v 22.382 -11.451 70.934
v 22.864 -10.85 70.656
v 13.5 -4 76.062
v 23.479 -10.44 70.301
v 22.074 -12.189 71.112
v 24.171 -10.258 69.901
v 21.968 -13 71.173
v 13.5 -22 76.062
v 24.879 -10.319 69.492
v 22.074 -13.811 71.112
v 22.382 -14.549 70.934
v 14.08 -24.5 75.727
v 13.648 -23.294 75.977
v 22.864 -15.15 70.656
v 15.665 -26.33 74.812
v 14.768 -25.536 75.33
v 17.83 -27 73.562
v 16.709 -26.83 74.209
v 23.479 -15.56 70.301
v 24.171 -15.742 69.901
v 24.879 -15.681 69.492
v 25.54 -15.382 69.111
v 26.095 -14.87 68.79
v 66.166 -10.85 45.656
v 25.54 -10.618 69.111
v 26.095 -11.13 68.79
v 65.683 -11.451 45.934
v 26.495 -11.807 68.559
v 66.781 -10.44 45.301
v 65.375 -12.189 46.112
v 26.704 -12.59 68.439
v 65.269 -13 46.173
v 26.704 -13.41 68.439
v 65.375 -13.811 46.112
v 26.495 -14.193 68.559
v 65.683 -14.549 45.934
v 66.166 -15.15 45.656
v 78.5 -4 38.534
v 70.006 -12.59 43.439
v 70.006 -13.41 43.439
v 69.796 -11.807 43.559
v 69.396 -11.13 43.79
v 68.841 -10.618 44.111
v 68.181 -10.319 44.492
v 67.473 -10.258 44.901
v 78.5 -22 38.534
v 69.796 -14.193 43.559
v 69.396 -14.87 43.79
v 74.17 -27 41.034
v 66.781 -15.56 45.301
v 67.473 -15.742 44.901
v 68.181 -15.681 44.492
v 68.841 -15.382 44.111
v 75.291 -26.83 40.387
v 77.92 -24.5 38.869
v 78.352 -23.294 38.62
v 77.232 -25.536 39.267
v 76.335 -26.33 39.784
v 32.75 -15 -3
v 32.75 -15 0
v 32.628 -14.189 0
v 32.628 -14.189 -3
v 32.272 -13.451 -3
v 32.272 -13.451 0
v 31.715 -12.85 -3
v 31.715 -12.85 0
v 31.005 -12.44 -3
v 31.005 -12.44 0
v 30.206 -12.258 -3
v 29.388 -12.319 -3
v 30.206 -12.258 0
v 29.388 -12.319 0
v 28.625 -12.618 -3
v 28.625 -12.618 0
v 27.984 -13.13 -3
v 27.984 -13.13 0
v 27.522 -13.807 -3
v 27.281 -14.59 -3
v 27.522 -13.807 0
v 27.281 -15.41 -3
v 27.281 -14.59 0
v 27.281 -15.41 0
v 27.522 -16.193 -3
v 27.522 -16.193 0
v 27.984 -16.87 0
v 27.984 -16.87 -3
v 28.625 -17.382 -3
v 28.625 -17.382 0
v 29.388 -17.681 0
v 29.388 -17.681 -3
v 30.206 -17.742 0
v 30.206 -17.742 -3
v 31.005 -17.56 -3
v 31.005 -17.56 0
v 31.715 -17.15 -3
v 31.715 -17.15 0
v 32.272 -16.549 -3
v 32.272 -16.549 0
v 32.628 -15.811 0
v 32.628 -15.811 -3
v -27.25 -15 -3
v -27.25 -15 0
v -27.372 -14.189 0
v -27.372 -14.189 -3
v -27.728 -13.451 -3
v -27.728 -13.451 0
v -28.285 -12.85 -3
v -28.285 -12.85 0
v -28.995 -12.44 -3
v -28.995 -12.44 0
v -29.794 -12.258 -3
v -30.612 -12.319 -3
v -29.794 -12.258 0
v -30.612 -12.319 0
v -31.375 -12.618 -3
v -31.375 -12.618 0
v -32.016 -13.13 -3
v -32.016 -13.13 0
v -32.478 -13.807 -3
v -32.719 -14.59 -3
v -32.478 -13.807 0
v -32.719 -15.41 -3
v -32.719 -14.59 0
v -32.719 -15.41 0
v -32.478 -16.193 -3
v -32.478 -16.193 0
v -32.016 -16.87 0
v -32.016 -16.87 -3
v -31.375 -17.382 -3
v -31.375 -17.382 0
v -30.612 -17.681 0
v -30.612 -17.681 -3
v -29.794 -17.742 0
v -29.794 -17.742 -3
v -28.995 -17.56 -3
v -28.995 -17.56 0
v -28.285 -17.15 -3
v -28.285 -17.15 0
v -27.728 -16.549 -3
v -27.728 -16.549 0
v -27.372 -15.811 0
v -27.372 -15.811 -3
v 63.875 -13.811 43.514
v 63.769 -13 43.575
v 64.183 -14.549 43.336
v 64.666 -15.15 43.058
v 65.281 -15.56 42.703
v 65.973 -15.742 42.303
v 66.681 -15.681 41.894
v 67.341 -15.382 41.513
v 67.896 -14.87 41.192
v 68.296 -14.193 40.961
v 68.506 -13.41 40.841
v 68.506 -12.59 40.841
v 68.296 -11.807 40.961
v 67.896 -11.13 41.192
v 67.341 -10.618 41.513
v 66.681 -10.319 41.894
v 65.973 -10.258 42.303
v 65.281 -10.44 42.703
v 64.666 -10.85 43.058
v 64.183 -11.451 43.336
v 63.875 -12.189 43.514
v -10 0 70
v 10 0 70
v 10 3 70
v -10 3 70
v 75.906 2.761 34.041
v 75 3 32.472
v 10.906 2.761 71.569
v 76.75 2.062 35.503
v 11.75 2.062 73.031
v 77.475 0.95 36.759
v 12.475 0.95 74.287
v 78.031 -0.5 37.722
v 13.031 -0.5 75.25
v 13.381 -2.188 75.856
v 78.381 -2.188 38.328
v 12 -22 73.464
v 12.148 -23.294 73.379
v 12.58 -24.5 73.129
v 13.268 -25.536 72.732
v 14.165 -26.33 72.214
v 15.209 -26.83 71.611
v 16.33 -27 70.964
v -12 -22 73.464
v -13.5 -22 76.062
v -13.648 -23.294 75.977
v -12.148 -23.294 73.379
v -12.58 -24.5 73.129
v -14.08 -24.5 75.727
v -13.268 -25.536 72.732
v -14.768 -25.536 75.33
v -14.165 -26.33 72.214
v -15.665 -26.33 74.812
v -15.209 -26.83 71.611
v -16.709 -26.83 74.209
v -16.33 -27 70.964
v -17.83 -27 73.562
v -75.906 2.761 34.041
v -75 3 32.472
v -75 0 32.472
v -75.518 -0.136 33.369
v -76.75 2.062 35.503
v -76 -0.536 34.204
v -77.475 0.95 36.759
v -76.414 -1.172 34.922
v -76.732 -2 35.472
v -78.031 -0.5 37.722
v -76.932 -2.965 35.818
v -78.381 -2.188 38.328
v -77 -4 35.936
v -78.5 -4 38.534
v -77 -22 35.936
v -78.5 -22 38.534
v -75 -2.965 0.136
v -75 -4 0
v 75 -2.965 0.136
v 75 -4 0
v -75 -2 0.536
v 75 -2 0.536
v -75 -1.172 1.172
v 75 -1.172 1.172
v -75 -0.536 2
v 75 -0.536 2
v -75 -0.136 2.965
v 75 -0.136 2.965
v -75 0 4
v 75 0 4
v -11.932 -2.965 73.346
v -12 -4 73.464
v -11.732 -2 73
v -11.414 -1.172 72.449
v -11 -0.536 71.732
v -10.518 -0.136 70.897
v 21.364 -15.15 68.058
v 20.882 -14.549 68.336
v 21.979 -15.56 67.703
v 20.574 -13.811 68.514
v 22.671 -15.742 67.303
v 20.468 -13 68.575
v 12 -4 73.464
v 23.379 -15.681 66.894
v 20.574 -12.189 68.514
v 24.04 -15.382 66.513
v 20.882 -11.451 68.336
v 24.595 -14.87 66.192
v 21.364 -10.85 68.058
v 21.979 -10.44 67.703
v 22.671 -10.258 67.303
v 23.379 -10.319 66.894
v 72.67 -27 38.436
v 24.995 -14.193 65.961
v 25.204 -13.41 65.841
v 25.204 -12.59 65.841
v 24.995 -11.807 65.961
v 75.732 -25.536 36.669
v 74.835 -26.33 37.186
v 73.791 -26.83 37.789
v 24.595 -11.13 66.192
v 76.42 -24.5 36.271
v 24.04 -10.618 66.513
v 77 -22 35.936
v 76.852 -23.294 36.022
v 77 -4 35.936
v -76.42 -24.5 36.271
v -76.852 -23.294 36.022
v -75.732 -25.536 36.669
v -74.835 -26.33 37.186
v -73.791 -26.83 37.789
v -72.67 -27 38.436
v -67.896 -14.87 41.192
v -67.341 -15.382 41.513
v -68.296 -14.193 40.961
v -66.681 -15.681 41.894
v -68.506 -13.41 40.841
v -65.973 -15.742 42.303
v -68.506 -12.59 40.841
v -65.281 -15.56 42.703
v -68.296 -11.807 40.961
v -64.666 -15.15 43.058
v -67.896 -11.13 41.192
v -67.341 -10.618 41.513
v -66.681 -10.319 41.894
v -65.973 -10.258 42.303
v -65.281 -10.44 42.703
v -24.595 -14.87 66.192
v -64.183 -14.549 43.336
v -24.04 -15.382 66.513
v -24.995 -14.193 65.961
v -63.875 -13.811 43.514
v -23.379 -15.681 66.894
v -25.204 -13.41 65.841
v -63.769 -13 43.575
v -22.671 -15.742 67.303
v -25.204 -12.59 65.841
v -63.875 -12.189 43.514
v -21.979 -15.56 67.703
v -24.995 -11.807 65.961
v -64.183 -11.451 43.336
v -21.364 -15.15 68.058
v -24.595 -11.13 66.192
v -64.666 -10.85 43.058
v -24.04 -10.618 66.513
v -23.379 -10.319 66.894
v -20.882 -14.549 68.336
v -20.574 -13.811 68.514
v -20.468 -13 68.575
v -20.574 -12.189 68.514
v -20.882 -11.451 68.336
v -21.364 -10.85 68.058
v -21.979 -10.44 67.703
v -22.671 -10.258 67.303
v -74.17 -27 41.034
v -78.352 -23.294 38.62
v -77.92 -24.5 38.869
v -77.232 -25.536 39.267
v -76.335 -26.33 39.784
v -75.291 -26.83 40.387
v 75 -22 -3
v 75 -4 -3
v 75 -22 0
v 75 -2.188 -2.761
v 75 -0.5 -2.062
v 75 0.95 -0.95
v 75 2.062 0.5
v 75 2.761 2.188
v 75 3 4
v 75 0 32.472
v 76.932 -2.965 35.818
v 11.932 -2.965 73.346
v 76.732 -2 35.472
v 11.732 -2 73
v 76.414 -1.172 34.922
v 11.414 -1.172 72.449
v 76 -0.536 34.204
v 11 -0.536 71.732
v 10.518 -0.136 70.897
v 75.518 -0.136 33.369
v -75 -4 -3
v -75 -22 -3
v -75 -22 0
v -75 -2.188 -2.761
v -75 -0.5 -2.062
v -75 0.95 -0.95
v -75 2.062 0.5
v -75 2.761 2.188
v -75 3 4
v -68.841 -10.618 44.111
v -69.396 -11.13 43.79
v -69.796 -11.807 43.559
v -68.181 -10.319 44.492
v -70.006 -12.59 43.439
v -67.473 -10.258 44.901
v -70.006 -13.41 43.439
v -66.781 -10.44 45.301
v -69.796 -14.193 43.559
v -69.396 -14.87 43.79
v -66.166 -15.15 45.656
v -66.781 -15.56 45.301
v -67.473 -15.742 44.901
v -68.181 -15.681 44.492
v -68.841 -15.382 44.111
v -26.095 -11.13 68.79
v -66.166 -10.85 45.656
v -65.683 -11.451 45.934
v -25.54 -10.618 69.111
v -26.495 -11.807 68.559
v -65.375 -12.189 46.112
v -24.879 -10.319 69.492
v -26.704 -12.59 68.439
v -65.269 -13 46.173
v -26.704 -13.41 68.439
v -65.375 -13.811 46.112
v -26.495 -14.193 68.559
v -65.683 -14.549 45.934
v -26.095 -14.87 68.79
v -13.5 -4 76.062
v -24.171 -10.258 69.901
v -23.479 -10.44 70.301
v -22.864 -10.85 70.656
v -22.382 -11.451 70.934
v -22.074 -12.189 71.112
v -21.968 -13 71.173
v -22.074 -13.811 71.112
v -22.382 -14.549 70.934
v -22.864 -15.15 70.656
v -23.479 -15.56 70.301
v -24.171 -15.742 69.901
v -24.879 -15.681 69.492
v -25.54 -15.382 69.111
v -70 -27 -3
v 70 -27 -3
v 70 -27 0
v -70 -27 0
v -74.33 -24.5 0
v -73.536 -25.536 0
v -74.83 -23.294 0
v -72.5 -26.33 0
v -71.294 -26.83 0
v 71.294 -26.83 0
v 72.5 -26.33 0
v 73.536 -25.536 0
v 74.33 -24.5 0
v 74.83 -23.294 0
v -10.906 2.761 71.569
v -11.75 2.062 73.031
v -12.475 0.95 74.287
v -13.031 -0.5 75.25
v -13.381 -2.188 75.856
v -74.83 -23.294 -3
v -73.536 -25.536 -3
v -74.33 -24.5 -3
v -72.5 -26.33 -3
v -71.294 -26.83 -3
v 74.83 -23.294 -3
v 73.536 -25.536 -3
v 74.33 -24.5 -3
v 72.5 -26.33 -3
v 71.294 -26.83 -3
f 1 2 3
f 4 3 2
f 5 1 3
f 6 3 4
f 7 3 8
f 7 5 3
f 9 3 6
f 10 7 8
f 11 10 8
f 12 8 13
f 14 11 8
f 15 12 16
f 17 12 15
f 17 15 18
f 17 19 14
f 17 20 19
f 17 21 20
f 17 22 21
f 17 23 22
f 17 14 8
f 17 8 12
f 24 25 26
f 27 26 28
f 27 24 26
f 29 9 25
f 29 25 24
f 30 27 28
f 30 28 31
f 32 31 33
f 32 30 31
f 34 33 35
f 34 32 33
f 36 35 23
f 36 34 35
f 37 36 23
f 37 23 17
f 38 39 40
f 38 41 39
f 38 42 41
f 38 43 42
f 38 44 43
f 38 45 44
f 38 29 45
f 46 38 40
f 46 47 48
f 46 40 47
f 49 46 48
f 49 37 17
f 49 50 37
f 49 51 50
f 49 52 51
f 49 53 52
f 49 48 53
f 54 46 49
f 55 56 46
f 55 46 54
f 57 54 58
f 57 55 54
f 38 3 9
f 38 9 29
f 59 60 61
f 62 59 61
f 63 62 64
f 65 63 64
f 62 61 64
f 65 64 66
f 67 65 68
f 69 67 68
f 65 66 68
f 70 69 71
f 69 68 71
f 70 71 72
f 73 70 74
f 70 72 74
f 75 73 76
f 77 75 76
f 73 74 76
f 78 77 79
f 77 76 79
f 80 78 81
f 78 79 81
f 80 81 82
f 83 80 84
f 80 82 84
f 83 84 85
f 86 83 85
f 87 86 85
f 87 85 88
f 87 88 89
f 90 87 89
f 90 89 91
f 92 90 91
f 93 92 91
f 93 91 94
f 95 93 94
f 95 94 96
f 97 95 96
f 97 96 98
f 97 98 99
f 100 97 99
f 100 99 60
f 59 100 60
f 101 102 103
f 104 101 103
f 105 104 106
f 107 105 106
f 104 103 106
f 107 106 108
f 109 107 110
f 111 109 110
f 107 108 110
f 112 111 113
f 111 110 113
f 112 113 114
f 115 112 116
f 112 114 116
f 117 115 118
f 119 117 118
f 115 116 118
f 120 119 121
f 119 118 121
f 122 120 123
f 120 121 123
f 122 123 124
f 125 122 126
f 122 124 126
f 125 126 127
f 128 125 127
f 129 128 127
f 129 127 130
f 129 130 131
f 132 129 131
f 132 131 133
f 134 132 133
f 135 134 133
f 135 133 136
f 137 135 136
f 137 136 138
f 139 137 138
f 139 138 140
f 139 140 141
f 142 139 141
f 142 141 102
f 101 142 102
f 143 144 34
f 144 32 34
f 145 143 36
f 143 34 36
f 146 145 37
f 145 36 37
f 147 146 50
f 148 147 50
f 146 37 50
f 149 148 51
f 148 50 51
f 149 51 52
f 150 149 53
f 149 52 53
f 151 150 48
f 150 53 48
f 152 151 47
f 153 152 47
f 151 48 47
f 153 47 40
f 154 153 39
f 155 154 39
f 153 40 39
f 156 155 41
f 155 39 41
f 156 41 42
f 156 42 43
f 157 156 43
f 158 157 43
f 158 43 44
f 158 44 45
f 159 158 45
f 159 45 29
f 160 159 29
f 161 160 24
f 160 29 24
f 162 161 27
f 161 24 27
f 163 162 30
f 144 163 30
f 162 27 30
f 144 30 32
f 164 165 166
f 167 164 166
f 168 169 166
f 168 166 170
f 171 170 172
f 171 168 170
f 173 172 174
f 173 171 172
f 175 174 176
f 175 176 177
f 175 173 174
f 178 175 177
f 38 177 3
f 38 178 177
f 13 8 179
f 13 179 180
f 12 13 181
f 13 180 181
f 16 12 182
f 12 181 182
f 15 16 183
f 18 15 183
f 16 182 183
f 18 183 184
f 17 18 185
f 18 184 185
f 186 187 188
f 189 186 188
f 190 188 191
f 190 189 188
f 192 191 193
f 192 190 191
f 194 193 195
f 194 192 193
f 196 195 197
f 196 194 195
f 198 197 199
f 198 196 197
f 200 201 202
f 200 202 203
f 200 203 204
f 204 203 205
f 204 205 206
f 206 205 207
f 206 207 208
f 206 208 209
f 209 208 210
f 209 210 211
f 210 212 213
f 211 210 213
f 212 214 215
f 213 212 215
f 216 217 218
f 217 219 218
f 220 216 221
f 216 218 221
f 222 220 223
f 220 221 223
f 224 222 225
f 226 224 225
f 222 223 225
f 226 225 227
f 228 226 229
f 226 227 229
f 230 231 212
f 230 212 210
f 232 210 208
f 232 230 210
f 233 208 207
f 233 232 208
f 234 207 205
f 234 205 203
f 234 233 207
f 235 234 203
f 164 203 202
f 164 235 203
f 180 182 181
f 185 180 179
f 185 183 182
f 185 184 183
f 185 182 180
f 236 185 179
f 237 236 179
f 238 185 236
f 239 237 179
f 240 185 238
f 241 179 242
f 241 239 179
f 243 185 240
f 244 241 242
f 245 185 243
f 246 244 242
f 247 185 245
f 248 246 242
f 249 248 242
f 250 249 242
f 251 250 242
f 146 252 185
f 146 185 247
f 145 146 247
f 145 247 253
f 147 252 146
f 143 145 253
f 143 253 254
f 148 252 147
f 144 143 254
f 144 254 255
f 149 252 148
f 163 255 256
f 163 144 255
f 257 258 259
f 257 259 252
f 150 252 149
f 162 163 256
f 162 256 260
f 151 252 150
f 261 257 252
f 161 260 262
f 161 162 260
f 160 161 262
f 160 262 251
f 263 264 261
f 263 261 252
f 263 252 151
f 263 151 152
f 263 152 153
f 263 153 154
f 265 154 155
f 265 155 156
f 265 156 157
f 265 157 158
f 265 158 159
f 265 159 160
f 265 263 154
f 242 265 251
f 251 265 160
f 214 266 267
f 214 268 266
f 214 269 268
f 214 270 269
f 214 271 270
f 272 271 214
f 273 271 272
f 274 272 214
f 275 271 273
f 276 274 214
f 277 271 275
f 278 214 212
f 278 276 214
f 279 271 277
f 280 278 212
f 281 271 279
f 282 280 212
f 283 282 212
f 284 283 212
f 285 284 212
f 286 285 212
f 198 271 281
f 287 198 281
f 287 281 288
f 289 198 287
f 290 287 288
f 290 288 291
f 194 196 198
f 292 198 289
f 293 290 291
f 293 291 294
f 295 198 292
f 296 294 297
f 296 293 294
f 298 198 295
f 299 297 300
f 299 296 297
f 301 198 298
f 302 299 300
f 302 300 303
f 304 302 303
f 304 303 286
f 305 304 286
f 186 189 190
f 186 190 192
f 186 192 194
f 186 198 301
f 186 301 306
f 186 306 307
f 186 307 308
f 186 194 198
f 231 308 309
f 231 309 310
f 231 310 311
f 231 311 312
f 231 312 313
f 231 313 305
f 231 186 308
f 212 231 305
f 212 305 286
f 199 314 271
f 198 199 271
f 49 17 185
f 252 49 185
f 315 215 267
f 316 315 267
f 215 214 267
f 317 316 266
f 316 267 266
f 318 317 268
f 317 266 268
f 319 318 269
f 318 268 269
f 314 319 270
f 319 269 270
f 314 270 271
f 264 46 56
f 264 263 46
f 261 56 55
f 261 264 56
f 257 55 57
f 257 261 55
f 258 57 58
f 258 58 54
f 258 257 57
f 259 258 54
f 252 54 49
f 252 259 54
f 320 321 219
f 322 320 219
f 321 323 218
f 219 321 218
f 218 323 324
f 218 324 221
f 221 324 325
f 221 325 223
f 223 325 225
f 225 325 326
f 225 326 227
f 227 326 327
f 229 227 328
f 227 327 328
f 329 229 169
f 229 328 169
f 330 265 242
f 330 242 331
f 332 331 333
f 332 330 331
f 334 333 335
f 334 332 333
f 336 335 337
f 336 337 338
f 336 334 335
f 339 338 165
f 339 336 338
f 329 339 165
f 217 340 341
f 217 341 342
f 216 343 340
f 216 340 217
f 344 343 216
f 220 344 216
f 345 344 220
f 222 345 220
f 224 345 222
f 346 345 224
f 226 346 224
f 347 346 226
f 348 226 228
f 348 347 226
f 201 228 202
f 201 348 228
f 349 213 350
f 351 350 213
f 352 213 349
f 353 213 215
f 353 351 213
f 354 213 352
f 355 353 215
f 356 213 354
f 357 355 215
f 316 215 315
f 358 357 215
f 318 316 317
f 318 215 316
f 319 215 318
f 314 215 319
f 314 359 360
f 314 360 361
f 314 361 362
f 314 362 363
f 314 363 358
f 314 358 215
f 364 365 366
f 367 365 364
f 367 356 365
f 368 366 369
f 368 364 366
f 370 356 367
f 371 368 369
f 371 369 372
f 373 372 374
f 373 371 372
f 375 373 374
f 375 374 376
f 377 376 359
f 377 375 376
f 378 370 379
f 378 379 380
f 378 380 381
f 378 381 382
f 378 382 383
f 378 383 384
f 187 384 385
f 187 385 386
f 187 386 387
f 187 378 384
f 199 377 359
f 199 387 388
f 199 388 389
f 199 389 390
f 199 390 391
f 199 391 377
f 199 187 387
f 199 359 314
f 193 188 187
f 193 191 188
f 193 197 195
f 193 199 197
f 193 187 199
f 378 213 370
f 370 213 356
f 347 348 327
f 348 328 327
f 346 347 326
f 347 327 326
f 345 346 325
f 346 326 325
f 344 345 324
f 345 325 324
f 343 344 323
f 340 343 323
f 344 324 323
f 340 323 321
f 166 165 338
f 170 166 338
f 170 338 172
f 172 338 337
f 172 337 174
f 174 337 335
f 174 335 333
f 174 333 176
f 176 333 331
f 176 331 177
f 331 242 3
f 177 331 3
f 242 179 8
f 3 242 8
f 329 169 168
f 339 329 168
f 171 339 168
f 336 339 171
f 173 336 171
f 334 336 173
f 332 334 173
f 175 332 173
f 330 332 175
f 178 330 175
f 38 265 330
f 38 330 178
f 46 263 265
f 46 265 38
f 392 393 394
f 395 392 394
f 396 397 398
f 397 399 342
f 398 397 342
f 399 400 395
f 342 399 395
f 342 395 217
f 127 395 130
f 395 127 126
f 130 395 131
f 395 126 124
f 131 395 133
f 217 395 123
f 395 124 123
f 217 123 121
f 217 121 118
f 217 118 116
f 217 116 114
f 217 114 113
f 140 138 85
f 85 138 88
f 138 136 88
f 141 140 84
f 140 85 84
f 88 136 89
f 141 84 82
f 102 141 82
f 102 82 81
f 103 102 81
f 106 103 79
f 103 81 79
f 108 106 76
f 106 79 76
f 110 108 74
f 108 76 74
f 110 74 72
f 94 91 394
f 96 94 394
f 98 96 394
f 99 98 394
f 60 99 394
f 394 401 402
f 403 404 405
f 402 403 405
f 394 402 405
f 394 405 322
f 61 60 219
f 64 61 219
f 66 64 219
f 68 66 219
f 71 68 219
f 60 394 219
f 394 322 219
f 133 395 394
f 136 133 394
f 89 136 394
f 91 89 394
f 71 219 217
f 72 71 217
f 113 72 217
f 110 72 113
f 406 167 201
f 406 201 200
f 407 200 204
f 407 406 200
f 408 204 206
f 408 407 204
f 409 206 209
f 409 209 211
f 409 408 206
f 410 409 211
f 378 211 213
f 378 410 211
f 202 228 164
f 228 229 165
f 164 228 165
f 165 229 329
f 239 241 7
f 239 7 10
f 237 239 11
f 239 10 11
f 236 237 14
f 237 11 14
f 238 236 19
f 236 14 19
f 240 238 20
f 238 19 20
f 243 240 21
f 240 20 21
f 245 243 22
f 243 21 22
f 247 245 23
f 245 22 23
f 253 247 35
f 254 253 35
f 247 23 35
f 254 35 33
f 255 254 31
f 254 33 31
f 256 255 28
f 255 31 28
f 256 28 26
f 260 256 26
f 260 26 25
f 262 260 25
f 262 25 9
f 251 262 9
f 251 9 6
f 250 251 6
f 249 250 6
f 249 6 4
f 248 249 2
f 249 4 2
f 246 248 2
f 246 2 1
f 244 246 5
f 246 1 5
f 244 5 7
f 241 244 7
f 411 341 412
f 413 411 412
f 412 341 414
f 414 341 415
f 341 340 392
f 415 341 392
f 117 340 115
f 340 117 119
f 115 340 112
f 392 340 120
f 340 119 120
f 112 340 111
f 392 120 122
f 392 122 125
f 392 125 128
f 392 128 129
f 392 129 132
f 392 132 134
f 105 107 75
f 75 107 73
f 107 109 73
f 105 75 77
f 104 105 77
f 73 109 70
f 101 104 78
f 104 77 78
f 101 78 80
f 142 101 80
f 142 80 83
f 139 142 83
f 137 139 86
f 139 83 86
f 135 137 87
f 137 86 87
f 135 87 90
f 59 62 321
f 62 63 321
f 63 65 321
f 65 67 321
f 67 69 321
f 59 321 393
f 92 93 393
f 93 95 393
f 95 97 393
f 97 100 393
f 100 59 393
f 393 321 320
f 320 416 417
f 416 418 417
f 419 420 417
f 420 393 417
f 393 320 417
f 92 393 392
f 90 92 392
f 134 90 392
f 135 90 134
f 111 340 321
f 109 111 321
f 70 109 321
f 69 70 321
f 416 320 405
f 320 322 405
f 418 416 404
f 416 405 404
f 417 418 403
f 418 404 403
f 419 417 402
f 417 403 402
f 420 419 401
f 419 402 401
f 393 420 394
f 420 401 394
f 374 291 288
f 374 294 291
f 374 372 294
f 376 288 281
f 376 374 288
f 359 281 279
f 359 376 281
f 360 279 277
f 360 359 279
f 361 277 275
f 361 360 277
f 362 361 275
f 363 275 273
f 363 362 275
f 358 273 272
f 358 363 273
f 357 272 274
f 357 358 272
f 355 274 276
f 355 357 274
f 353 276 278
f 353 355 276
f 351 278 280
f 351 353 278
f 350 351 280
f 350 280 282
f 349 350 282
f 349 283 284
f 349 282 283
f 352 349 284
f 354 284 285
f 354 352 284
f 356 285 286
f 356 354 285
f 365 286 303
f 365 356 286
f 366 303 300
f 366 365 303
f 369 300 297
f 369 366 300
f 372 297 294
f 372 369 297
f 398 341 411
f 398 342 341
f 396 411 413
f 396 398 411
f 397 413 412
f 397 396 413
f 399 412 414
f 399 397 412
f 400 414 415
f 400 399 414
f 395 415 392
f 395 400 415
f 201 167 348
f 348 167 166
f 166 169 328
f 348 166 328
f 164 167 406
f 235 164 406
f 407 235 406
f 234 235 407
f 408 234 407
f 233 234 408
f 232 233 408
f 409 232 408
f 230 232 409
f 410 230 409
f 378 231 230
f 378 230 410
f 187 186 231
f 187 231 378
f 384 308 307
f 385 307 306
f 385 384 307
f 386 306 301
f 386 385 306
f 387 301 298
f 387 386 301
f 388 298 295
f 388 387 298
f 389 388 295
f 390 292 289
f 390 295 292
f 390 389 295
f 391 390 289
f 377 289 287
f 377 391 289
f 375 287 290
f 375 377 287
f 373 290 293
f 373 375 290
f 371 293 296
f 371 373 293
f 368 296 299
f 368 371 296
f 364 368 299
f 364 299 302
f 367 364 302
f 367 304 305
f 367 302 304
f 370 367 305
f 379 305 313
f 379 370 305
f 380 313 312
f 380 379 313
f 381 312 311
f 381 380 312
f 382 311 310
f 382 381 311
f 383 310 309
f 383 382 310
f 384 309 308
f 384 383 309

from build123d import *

# Parameters (mm, degrees)
ODGI_CIE_BAZOWE1_DEPTH        = 75
WYTNIJ_WYCI_GNI_CIE1_DEPTH    = 10
ODGI_CIE_KRAW_DZI1_DEPTH      = 75.055534995
ODGI_CIE_KRAW_DZI1_BEND_DEPTH = 75.055534995
OTW_R_POD_RUB_M52_D           = 5.5
OTW_R_POD_RUB_M52_DEPTH       = 10
OTW_R_POD_RUB_M52_TIP         = 1.652366702
OTW_R_POD_RUB_M51_AT_2_COUNT  = 2
OTW_R_POD_RUB_M51_AT_2_PITCH  = 50
ZAOKR_GLENIE1_R               = 5


# Sheet-metal steps are written as plain solids
with BuildPart() as part:
    # Szkic1 → Odgięcie bazowe1 (new, symmetric)
    with BuildSketch(Plane(origin=(0, 0, 0), x_dir=(0, 0, -1), z_dir=(1, 0, 0))):
        with BuildLine():
            Line((0, -27), (0, -4))
            ThreePointArc((0, -4), (-1.171572875, -1.171572875), (-4, 0))
            Line((-4, 0), (-70, 0))
            Line((-70, 0), (-70, 3))
            Line((-70, 3), (-4, 3))
            ThreePointArc((-4, 3), (0.949747468, 0.949747468), (3, -4))
            Line((3, -4), (3, -27))
            Line((3, -27), (0, -27))
        make_face()
    extrude(amount=ODGI_CIE_BAZOWE1_DEPTH, both=True)

    # Szkic6 → Wytnij-wyciągnięcie1 (cut)
    with BuildSketch(Plane(origin=(0, 3, 0), x_dir=(1, 0, 0), z_dir=(0, 1, 0))):
        Polygon((-75, -32.472232503), (-10, -70), (-75, -70), align=None)
        Polygon((75, -70), (75, -32.472232503), (10, -70), align=None)
    extrude(amount=-WYTNIJ_WYCI_GNI_CIE1_DEPTH, mode=Mode.SUBTRACT)

    # Odgięcie krawędzi1 section (across the edge) → Odgięcie krawędzi1 (add)
    with BuildSketch(Plane(origin=(-12, 0, 73.464101615), x_dir=(0.4999999999999948, -3.3854238149706416e-15, -0.8660254037844417), z_dir=(-0.8660254037844417, 0, -0.4999999999999948))):
        with BuildLine():
            Line((-3, 4), (-3, 27))
            Line((-3, 27), (0, 27))
            Line((0, 27), (0, 4))
            ThreePointArc((0, 4), (1.171572875, 1.171572875), (4, 0))
            Line((4, 0), (4, -3))
            ThreePointArc((4, -3), (-0.949747468, -0.949747468), (-3, 4))
        make_face()
    extrude(amount=ODGI_CIE_KRAW_DZI1_DEPTH)

    # Odgięcie krawędzi1 section 2 (across the edge) → Odgięcie krawędzi1 bend (add)
    with BuildSketch(Plane(origin=(77, 0, 35.936334118), x_dir=(-0.49999999999999467, -3.3854238149706423e-15, -0.8660254037844417), z_dir=(-0.8660254037844417, 0, 0.49999999999999467))):
        with BuildLine():
            Line((-3, 4), (-3, 27))
            Line((-3, 27), (0, 27))
            Line((0, 27), (0, 4))
            ThreePointArc((0, 4), (1.171572875, 1.171572875), (4, 0))
            Line((4, 0), (4, -3))
            ThreePointArc((4, -3), (-0.949747468, -0.949747468), (-3, 4))
        make_face()
    extrude(amount=ODGI_CIE_KRAW_DZI1_BEND_DEPTH)

    # Otwór pod śrubę M52
    with Locations(Plane(origin=(0, 0, -3), x_dir=(-1, 0, 0), z_dir=(0, 0, -1))):
        with Locations((-30, -15), (30, -15)):
            Hole(OTW_R_POD_RUB_M52_D / 2, depth=OTW_R_POD_RUB_M52_DEPTH)
            with Locations((0, 0, -(OTW_R_POD_RUB_M52_DEPTH + OTW_R_POD_RUB_M52_TIP / 2))):  # 118° drill point
                Cone(0, OTW_R_POD_RUB_M52_D / 2, OTW_R_POD_RUB_M52_TIP, mode=Mode.SUBTRACT)

    # Szkic16 → Otwór pod śrubę M51 (revolve, cut)
    with BuildSketch(Plane(origin=(-67.650635095, -13, 44.798294078), x_dir=(0.8660254037844417, 0, 0.4999999999999949), z_dir=(0, 1, 0))):
        Polygon((0, 0), (0, 11.652366702), (2.75, 10), (2.75, 0), align=None)
    otw_r_pod_rub_m51 = revolve(axis=Axis((-70.825635095, -13, 50.297555392), (0.4999999999999949, -3.3879771740092313e-15, -0.8660254037844417)), mode=Mode.SUBTRACT)

    # Otwór pod śrubę M51 at 2: Otwór pod śrubę M51 ×2
    with Locations(*[Vector(0.8660254037844417, 1.9224128461953825e-15, 0.49999999999999495) * (i * OTW_R_POD_RUB_M51_AT_2_PITCH) for i in range(1, OTW_R_POD_RUB_M51_AT_2_COUNT)]):
        add(otw_r_pod_rub_m51, mode=Mode.SUBTRACT)

    # Lustro1: Otwór pod śrubę M51 across plane
    add(otw_r_pod_rub_m51.mirror(Plane(origin=(0, 0, 0), x_dir=(0, 0, 1), z_dir=(1, 0, 0))), mode=Mode.SUBTRACT)

    # Lustro1 copy 1 sketch → Lustro1 copy 1 (revolve, cut)
    with BuildSketch(Plane(origin=(24.349364905, -13, 69.798294078), x_dir=(-0.8660254037844417, 0, 0.4999999999999949), z_dir=(0, 1, 0))):
        Polygon((0, 0), (0, -11.652366702), (2.75, -10), (2.75, 0), align=None)
    revolve(axis=Axis((27.524364905, -13, 75.297555392), (0.4999999999999949, 3.3879771740092313e-15, 0.8660254037844417)), mode=Mode.SUBTRACT)

    # Zaokrąglenie1
    zaokr_glenie1_edges = [part.edges().sort_by_distance(p)[0] for p in [
        (75, -27, -1.5),
        (-12.75, -27, 74.763139721),
        (-77.75, -27, 37.235372223),
        (-75, -27, -1.5),
        (77.75, -27, 37.235372223),
        (12.75, -27, 74.763139721),
    ]]
    fillet(zaokr_glenie1_edges, radius=ZAOKR_GLENIE1_R)


solid = part.part
